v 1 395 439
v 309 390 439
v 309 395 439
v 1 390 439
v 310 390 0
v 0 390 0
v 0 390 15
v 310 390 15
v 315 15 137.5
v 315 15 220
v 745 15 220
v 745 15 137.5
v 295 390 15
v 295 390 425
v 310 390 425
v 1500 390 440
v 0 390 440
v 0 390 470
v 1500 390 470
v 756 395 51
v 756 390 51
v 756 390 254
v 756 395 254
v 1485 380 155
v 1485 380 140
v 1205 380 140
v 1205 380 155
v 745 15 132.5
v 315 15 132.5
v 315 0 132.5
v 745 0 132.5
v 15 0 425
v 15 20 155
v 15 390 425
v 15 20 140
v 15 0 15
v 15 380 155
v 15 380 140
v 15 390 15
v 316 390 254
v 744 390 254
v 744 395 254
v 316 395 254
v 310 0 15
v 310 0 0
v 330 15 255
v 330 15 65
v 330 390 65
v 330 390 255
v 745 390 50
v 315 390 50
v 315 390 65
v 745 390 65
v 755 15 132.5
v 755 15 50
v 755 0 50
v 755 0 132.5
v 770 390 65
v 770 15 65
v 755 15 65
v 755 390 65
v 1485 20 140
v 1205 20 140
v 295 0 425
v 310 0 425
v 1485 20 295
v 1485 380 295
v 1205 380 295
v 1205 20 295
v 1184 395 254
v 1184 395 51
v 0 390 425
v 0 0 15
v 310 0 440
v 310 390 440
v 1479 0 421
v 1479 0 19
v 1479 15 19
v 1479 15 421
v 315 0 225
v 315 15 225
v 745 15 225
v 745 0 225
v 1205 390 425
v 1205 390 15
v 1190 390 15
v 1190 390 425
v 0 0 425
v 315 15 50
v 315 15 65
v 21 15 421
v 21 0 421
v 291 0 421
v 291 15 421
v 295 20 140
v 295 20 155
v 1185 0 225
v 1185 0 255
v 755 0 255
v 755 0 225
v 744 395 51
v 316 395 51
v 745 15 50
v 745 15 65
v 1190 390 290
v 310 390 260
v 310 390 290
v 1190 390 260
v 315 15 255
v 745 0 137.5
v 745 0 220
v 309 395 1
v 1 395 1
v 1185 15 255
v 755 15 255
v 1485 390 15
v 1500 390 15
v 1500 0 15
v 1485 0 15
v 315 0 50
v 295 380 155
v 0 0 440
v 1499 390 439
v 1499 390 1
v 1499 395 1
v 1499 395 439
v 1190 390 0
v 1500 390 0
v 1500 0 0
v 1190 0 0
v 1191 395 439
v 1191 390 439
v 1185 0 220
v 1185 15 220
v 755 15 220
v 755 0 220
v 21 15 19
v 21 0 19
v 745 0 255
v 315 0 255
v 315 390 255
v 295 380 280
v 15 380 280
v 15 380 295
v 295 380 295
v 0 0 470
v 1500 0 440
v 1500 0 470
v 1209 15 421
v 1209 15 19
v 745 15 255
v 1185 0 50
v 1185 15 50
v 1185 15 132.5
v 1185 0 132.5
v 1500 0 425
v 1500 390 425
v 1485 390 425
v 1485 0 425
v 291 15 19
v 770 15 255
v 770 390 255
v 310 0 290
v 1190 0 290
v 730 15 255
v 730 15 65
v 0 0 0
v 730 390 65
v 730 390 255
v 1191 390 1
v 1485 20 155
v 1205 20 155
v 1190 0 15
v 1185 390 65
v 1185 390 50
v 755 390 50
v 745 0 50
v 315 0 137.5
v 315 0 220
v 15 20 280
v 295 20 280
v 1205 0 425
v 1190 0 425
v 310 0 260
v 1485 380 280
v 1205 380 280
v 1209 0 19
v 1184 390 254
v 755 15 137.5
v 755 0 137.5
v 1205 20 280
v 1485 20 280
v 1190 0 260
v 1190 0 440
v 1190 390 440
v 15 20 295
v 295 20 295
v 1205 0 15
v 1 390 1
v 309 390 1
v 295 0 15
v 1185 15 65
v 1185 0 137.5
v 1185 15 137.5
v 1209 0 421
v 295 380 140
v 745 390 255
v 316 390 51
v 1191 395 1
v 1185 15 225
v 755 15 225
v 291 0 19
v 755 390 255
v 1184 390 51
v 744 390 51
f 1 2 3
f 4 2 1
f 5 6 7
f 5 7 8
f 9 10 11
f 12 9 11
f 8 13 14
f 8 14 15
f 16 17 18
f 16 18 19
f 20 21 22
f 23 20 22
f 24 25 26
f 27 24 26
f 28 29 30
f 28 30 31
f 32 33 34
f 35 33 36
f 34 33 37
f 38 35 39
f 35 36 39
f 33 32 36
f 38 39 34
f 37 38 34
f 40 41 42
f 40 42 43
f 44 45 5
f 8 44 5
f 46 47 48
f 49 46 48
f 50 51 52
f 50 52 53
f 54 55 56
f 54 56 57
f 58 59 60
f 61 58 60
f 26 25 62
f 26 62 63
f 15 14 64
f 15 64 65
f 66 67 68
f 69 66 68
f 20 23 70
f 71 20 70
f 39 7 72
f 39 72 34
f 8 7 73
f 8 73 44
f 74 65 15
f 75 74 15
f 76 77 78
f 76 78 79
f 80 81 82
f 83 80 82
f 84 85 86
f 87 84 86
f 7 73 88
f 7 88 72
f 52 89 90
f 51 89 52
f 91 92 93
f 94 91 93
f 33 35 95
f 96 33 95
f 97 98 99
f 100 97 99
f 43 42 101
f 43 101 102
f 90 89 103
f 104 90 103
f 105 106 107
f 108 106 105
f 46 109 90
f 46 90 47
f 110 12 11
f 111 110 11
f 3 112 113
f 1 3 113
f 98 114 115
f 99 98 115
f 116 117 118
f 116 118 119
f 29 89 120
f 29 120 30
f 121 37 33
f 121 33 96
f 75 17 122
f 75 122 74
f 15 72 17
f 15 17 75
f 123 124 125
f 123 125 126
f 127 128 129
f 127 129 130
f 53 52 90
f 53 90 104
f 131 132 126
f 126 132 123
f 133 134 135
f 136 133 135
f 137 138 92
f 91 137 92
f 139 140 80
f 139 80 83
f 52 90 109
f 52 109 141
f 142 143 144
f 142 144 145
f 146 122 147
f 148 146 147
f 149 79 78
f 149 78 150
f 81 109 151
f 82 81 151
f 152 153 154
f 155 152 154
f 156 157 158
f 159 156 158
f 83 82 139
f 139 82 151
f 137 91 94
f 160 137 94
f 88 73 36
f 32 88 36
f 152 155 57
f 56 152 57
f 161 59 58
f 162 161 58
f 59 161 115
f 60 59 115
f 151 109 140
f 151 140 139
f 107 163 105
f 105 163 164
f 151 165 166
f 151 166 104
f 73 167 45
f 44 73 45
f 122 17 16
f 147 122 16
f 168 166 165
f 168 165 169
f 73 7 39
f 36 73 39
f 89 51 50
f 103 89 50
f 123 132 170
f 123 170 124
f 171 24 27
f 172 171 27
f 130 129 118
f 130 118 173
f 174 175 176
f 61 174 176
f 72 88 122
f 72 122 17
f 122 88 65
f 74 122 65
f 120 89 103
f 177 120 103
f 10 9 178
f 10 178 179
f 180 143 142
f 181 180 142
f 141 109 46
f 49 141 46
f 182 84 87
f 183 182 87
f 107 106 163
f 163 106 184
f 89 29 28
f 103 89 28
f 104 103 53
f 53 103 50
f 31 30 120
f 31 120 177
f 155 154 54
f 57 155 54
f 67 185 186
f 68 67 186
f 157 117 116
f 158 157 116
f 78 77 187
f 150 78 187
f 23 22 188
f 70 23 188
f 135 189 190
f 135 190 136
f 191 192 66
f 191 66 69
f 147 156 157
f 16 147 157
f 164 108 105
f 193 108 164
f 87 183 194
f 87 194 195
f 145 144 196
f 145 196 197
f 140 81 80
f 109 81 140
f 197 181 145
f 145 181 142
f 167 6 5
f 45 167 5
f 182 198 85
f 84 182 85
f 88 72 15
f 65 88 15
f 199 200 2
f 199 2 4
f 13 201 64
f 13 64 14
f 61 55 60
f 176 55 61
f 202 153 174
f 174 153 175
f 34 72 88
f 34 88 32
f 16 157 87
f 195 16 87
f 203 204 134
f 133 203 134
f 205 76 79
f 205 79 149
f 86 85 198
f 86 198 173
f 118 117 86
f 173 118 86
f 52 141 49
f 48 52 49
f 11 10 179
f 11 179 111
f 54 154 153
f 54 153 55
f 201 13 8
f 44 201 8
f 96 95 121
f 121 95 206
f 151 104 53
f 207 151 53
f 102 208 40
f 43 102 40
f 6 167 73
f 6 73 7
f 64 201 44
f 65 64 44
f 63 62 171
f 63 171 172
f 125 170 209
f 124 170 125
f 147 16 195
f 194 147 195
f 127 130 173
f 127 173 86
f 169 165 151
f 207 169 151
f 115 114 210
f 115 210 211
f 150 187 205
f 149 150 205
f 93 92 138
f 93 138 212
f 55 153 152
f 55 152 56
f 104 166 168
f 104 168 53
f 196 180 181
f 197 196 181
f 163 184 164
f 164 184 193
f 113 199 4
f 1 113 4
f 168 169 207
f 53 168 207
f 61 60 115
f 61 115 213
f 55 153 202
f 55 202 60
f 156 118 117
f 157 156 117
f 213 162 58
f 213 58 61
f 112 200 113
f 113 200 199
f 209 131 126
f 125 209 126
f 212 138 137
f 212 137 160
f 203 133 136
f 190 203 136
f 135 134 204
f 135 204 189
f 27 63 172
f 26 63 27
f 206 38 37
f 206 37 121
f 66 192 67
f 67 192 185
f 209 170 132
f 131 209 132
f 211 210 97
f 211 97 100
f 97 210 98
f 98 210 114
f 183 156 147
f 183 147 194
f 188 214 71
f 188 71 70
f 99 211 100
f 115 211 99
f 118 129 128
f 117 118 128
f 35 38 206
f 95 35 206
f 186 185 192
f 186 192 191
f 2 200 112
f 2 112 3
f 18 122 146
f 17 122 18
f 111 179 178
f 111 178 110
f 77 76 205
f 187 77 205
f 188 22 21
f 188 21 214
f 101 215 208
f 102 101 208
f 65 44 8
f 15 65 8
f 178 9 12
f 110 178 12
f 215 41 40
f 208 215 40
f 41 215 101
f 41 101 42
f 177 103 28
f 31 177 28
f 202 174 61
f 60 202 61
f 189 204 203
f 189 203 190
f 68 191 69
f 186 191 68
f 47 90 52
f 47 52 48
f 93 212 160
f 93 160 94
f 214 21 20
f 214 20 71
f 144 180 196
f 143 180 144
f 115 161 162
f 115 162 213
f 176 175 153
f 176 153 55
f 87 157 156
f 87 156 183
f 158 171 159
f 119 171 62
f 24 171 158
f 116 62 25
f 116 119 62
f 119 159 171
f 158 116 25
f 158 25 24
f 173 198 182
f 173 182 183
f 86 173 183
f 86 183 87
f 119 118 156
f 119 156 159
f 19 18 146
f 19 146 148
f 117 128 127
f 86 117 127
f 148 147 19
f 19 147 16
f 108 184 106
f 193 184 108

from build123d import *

# Parameters (mm, degrees)
F0_W      = 310
F0_H      = 390
F1_DEPTH  = 15
F3_W      = 15
F3_H      = 390
F4_DEPTH  = 410
F5_W      = 310
F5_H      = 390
F6_DEPTH  = 15
F7_W      = 308
F7_H      = 438
F8_DEPTH  = 5
F11_W     = 280
F11_H     = 360
F12_DEPTH = 15
F13_W     = 280
F13_H     = 360
F14_DEPTH = 15
F15_W     = 270
F15_H     = 402
F16_DEPTH = 15
F19_W     = 1500
F19_H     = 390
F20_DEPTH = 30
F22_W     = 880
F22_H     = 390
F23_DEPTH = 30
F25_W     = 430
F25_H     = 375
F26_DEPTH = 15
F27_W     = 15
F27_H     = 375
F28_DEPTH = 190
F29_W     = 430
F29_H     = 82.5
F30_DEPTH = 15
F29_H_2   = 30
F31_W     = 428
F31_H     = 203
F32_DEPTH = 5


with BuildPart() as f1:
    # F0 (on Top) → F1 (new body)
    with BuildSketch(Plane.XY):
        with Locations((155, 195)):
            Rectangle(F0_W, F0_H)
    extrude(amount=F1_DEPTH)


with BuildPart() as f4:
    # F3 (on offset) → F4 (new body)
    with BuildSketch(Plane.XY.offset(15)):
        with Locations((7.5, 195)):
            Rectangle(F3_W, F3_H)
    extrude(amount=F4_DEPTH)

    # F11 (on offset) → F12 (join)
    with BuildSketch(Plane.XY.offset(140)):
        with Locations((155, 200)):
            Rectangle(F11_W, F11_H)
    extrude(amount=F12_DEPTH)


with BuildPart() as f4b:
    # F3 (on offset) → F4, piece 2 (new body)
    with BuildSketch(Plane.XY.offset(15)):
        with Locations((302.5, 195)):
            Rectangle(F3_W, F3_H)
    extrude(amount=F4_DEPTH)


with BuildPart() as f6:
    # F5 (on face) → F6 (new body)
    with BuildSketch(Plane.XY.offset(425)):
        with Locations((155, 195)):
            Rectangle(F5_W, F5_H)
    extrude(amount=F6_DEPTH)


with BuildPart() as f8:
    # F7 (on face) → F8 (new body)
    with BuildSketch(Plane(origin=(0, 390, 0), x_dir=(-1, 0, 0), z_dir=(0, 1, 0))):
        with Locations((-155, 220)):
            Rectangle(F7_W, F7_H)
    extrude(amount=F8_DEPTH)


with BuildPart() as f14:
    # F13 (on offset) → F14 (new body)
    with BuildSketch(Plane.XY.offset(280)):
        with Locations((155, 200)):
            Rectangle(F13_W, F13_H)
    extrude(amount=F14_DEPTH)


with BuildPart() as f16:
    # F15 (on face) → F16 (new body)
    with BuildSketch(Plane.XZ):
        with Locations((156, 220)):
            Rectangle(F15_W, F15_H)
    extrude(amount=-F16_DEPTH)


with BuildPart() as f18_1:
    # F18: instance of F1
    add(f1.part.mirror(Plane.YZ.offset(750)))


with BuildPart() as f18_2:
    # F18: instance of F4
    add(f4.part.mirror(Plane.YZ.offset(750)))


with BuildPart() as f18_3:
    # F18: instance of F4b
    add(f4b.part.mirror(Plane.YZ.offset(750)))


with BuildPart() as f18_4:
    # F18: instance of F8
    add(f8.part.mirror(Plane.YZ.offset(750)))


with BuildPart() as f18_5:
    # F18: instance of F6
    add(f6.part.mirror(Plane.YZ.offset(750)))


with BuildPart() as f18_6:
    # F18: instance of F14
    add(f14.part.mirror(Plane.YZ.offset(750)))


with BuildPart() as f18_7:
    # F18: instance of F16
    add(f16.part.mirror(Plane.YZ.offset(750)))


with BuildPart() as f20:
    # F19 (on face) → F20 (new body)
    with BuildSketch(Plane.XY.offset(440)):
        with Locations((750, 195)):
            Rectangle(F19_W, F19_H)
    extrude(amount=F20_DEPTH)


with BuildPart() as f23:
    # F22 (on offset) → F23 (new body)
    with BuildSketch(Plane(origin=(0, 0, 260), x_dir=(1, 0, 0), z_dir=(0, 0, -1))):
        with Locations((750, -195)):
            Rectangle(F22_W, F22_H)
    extrude(amount=-F23_DEPTH)


with BuildPart() as f26:
    # F25 (on offset) → F26 (new body)
    with BuildSketch(Plane.XY.offset(50)):
        with Locations((530, 202.5)):
            Rectangle(F25_W, F25_H)
    extrude(amount=F26_DEPTH)


with BuildPart() as f28:
    # F27 (on face) → F28 (new body)
    with BuildSketch(Plane.XY.offset(65)):
        with Locations((322.5, 202.5)):
            Rectangle(F27_W, F27_H)
    extrude(amount=F28_DEPTH)


with BuildPart() as f28b:
    # F27 (on face) → F28, piece 2 (new body)
    with BuildSketch(Plane.XY.offset(65)):
        with Locations((737.5, 202.5)):
            Rectangle(F27_W, F27_H)
    extrude(amount=F28_DEPTH)


with BuildPart() as f30:
    # F29 (on face) → F30 (new body)
    with BuildSketch(Plane.XZ.offset(-15)):
        with Locations((530, 91.25)):
            Rectangle(F29_W, F29_H)
    extrude(amount=F30_DEPTH)


with BuildPart() as f30b:
    # F29 (on face) → F30, piece 2 (new body)
    with BuildSketch(Plane.XZ.offset(-15)):
        with Locations((530, 178.75)):
            Rectangle(F29_W, F29_H)
    extrude(amount=F30_DEPTH)


with BuildPart() as f30c:
    # F29 (on face) → F30, piece 3 (new body)
    with BuildSketch(Plane.XZ.offset(-15)):
        with Locations((530, 240)):
            Rectangle(F29_W, F29_H_2)
    extrude(amount=F30_DEPTH)


with BuildPart() as f32:
    # F31 (on face) → F32 (new body)
    with BuildSketch(Plane(origin=(0, 390, 0), x_dir=(-1, 0, 0), z_dir=(0, 1, 0))):
        with Locations((-530, 152.5)):
            Rectangle(F31_W, F31_H)
    extrude(amount=F32_DEPTH)


with BuildPart() as f33_1:
    # F33: instance of F26
    add(f26.part.mirror(Plane.YZ.offset(750)))


with BuildPart() as f33_2:
    # F33: instance of F30c
    add(f30c.part.mirror(Plane.YZ.offset(750)))


with BuildPart() as f33_3:
    # F33: instance of F30b
    add(f30b.part.mirror(Plane.YZ.offset(750)))


with BuildPart() as f33_4:
    # F33: instance of F30
    add(f30.part.mirror(Plane.YZ.offset(750)))


with BuildPart() as f33_5:
    # F33: instance of F28b
    add(f28b.part.mirror(Plane.YZ.offset(750)))


with BuildPart() as f33_6:
    # F33: instance of F32
    add(f32.part.mirror(Plane.YZ.offset(750)))


solid = Compound([f1.part, f4.part, f4b.part, f6.part, f8.part, f14.part, f16.part, f18_1.part, f18_2.part, f18_3.part, f18_4.part, f18_5.part, f18_6.part, f18_7.part, f20.part, f23.part, f26.part, f28.part, f28b.part, f30.part, f30b.part, f30c.part, f32.part, f33_1.part, f33_2.part, f33_3.part, f33_4.part, f33_5.part, f33_6.part])
